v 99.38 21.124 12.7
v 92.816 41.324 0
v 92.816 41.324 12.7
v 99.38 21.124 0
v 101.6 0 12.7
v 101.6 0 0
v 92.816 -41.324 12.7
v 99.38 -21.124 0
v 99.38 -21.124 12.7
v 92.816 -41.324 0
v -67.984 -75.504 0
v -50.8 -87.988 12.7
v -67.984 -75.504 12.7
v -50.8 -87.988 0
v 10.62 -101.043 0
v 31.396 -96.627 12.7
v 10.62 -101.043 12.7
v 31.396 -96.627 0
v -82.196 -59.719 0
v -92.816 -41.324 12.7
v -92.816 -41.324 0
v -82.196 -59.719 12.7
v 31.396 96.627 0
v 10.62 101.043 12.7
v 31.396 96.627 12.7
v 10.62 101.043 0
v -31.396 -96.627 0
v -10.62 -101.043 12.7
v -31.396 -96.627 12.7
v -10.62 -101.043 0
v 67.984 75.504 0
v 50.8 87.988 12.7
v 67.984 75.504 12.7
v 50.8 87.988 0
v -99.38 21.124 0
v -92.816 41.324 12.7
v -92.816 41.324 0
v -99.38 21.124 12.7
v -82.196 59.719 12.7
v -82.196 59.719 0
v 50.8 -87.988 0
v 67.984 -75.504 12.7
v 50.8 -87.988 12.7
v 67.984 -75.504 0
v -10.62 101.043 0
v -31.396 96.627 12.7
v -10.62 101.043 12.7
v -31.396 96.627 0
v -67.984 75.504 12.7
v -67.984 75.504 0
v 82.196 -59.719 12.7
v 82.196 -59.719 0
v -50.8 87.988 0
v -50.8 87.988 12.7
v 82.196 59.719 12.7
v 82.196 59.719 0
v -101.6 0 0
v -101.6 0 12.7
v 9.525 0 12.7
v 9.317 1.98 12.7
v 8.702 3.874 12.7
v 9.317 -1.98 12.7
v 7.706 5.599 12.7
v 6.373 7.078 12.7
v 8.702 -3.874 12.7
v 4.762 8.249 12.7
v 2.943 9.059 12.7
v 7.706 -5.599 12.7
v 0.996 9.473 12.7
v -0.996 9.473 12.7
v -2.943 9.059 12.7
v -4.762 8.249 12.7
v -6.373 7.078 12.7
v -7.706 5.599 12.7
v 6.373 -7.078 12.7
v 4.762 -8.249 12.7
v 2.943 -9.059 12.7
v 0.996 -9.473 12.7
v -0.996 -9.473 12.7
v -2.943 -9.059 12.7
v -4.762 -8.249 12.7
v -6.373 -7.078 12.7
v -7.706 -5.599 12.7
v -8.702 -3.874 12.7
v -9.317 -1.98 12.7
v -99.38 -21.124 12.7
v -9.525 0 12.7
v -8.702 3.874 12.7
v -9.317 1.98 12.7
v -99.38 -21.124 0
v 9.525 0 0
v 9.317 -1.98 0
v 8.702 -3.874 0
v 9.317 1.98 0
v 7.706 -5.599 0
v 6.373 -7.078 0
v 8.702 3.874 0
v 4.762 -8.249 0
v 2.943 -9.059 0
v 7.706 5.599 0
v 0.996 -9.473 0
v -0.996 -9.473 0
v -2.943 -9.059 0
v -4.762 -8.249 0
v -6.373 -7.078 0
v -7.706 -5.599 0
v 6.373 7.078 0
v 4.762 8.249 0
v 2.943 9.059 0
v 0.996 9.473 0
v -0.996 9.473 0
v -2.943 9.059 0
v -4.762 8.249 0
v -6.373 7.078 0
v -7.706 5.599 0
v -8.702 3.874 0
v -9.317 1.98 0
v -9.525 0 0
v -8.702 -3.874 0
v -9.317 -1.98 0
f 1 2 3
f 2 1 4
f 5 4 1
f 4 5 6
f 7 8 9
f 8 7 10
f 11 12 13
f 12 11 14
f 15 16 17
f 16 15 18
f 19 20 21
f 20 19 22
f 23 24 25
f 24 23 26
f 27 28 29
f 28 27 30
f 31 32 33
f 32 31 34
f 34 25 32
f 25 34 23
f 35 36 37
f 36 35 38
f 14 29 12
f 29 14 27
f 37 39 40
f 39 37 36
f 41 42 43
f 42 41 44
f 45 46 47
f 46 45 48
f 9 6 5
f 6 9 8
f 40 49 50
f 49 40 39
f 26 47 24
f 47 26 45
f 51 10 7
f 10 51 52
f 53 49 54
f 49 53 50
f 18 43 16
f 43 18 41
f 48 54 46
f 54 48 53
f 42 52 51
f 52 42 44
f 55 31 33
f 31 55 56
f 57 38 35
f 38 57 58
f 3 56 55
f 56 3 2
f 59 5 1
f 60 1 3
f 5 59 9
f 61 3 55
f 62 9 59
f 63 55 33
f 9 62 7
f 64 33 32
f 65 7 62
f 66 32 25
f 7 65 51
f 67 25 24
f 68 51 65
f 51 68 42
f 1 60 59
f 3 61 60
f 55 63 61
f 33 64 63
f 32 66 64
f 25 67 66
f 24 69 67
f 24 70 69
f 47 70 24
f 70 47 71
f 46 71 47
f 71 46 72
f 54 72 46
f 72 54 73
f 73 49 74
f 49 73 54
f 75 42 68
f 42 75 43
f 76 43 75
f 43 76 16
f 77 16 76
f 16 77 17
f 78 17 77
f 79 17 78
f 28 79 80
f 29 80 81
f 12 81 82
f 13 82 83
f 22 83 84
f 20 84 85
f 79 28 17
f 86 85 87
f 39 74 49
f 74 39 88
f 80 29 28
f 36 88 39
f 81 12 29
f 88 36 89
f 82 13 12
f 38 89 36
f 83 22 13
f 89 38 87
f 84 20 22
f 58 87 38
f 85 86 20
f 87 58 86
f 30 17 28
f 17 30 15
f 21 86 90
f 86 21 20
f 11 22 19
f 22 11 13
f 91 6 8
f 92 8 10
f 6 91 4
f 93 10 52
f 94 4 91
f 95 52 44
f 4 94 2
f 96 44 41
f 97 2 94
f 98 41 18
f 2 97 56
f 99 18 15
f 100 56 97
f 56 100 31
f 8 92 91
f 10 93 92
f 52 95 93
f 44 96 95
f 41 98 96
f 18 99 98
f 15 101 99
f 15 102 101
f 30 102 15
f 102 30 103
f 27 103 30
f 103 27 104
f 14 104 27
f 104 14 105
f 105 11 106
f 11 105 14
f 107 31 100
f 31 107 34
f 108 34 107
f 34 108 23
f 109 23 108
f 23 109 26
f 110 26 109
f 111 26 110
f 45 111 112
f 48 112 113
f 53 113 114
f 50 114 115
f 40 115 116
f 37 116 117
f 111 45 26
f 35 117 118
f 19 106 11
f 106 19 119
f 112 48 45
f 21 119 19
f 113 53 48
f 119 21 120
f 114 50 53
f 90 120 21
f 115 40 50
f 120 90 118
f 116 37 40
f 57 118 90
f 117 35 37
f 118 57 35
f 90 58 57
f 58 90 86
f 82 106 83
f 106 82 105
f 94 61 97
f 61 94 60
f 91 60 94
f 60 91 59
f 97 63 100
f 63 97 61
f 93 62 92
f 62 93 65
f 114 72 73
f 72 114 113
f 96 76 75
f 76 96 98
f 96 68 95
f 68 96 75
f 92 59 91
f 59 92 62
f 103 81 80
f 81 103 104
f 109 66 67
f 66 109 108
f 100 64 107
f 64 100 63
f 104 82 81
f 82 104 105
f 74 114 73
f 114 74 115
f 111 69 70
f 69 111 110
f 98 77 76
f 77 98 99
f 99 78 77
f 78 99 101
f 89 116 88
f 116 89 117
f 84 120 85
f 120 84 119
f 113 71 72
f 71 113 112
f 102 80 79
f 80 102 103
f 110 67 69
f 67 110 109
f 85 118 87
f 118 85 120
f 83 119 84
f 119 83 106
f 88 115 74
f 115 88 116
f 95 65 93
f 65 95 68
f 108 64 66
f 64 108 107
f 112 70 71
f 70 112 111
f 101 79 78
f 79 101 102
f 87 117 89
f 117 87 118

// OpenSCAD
difference()
{
//aluminum blank 1 
//Height: 0.5inch height = 12.7mm 
//Diameter: 4 inch diameter = 101.6mm
cylinder(h = 12.7, r = 101.6); 

//middle holes 1/4 inch = 6.35mm9.525
cylinder(h = 12.8, r = 9.525); 

    
//smaller holes 1/4 inch = 6.35mm
//translate(10,10,10)    cylinder(h = 12.8, r = 6.35,center=false); 

}
